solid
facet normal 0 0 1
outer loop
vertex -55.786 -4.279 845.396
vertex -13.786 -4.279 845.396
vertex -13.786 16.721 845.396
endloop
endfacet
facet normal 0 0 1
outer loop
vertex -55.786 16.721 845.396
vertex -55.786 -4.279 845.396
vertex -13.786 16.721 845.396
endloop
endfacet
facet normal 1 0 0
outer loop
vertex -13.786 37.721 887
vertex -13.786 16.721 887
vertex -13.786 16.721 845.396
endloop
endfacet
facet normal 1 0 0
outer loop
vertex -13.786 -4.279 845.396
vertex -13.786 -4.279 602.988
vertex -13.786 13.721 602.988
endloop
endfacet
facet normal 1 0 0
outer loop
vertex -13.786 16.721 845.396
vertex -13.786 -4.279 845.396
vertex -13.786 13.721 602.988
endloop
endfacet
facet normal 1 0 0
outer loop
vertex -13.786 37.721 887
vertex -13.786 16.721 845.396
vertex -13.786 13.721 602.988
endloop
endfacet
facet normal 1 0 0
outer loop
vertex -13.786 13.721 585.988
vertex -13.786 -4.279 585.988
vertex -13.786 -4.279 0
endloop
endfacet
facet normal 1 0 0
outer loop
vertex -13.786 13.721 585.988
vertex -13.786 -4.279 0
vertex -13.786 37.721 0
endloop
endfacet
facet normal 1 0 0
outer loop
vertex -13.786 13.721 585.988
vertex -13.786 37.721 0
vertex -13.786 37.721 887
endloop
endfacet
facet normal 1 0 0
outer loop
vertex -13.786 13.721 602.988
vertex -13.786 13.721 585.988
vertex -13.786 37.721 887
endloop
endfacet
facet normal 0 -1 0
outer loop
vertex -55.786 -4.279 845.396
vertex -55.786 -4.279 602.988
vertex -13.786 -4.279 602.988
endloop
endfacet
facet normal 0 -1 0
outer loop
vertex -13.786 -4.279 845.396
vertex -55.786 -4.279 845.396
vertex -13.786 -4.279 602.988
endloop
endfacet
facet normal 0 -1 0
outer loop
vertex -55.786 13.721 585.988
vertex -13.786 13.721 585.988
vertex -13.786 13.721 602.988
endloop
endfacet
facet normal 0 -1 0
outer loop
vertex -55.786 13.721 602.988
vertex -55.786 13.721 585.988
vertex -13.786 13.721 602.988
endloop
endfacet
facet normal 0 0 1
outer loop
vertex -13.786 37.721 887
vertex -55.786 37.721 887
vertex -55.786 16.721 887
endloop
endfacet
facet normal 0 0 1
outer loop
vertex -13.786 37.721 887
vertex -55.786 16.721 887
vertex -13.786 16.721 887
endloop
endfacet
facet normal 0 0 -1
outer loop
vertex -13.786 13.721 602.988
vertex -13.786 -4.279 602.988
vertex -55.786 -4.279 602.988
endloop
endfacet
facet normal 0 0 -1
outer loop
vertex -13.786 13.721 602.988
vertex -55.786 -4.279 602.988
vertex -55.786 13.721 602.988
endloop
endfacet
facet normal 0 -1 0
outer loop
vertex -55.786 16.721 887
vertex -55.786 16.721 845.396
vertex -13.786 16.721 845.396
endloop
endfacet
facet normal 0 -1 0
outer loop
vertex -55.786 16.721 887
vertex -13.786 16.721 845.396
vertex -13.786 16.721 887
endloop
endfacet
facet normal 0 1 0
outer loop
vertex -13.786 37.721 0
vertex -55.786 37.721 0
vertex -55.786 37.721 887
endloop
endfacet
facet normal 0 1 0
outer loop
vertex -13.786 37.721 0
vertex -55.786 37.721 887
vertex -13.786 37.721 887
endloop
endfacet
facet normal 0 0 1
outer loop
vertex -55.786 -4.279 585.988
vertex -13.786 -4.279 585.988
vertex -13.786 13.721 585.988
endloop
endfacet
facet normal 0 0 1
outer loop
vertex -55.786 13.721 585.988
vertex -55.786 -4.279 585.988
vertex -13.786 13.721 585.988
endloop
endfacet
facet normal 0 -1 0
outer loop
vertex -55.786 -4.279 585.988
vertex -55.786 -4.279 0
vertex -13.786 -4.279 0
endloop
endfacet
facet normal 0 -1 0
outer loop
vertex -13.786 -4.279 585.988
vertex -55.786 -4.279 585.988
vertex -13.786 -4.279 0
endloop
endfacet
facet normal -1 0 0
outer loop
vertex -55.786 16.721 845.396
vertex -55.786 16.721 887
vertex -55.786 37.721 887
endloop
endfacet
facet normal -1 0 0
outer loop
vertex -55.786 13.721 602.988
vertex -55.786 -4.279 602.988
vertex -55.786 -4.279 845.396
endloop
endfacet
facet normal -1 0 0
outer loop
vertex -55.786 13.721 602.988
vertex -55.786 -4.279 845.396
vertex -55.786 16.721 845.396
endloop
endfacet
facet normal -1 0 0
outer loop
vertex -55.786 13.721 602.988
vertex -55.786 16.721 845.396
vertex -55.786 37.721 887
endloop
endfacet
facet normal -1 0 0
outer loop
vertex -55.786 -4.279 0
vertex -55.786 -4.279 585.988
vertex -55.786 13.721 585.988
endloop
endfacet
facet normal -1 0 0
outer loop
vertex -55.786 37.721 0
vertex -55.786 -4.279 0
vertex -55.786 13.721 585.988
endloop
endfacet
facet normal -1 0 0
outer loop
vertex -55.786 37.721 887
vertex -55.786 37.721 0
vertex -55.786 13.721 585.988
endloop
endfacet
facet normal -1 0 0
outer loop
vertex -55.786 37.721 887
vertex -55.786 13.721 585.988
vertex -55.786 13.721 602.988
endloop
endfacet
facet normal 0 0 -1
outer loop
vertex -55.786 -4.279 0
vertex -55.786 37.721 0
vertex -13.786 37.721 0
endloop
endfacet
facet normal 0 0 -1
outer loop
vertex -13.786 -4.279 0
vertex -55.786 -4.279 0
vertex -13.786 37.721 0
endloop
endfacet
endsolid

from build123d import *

# Parameters (mm, degrees)
F0_W     = 42
F0_H     = 42
F1_DEPTH = 887
F2_W     = 21
F2_H     = 41.604375
F3_DEPTH = 42
F4_W     = 18
F4_H     = 17
F5_DEPTH = 42


with BuildPart() as f1:
    # F0 (on Top) → F1 (new body)
    with BuildSketch(Plane.XY):
        with Locations((-34.786186, 16.720576)):
            Rectangle(F0_W, F0_H)
    extrude(amount=F1_DEPTH)

    # F2 (on face) → F3 (cut)
    with BuildSketch(Plane.YZ.offset(-13.786186)):
        with Locations((6.220576, 866.197813)):
            Rectangle(F2_W, F2_H)
    extrude(amount=-F3_DEPTH, mode=Mode.SUBTRACT)

    # F4 (on face) → F5 (cut)
    with BuildSketch(Plane.YZ.offset(-13.786186)):
        with Locations((4.720576, 594.488045)):
            Rectangle(F4_W, F4_H)
    extrude(amount=-F5_DEPTH, mode=Mode.SUBTRACT)


solid = f1.part
